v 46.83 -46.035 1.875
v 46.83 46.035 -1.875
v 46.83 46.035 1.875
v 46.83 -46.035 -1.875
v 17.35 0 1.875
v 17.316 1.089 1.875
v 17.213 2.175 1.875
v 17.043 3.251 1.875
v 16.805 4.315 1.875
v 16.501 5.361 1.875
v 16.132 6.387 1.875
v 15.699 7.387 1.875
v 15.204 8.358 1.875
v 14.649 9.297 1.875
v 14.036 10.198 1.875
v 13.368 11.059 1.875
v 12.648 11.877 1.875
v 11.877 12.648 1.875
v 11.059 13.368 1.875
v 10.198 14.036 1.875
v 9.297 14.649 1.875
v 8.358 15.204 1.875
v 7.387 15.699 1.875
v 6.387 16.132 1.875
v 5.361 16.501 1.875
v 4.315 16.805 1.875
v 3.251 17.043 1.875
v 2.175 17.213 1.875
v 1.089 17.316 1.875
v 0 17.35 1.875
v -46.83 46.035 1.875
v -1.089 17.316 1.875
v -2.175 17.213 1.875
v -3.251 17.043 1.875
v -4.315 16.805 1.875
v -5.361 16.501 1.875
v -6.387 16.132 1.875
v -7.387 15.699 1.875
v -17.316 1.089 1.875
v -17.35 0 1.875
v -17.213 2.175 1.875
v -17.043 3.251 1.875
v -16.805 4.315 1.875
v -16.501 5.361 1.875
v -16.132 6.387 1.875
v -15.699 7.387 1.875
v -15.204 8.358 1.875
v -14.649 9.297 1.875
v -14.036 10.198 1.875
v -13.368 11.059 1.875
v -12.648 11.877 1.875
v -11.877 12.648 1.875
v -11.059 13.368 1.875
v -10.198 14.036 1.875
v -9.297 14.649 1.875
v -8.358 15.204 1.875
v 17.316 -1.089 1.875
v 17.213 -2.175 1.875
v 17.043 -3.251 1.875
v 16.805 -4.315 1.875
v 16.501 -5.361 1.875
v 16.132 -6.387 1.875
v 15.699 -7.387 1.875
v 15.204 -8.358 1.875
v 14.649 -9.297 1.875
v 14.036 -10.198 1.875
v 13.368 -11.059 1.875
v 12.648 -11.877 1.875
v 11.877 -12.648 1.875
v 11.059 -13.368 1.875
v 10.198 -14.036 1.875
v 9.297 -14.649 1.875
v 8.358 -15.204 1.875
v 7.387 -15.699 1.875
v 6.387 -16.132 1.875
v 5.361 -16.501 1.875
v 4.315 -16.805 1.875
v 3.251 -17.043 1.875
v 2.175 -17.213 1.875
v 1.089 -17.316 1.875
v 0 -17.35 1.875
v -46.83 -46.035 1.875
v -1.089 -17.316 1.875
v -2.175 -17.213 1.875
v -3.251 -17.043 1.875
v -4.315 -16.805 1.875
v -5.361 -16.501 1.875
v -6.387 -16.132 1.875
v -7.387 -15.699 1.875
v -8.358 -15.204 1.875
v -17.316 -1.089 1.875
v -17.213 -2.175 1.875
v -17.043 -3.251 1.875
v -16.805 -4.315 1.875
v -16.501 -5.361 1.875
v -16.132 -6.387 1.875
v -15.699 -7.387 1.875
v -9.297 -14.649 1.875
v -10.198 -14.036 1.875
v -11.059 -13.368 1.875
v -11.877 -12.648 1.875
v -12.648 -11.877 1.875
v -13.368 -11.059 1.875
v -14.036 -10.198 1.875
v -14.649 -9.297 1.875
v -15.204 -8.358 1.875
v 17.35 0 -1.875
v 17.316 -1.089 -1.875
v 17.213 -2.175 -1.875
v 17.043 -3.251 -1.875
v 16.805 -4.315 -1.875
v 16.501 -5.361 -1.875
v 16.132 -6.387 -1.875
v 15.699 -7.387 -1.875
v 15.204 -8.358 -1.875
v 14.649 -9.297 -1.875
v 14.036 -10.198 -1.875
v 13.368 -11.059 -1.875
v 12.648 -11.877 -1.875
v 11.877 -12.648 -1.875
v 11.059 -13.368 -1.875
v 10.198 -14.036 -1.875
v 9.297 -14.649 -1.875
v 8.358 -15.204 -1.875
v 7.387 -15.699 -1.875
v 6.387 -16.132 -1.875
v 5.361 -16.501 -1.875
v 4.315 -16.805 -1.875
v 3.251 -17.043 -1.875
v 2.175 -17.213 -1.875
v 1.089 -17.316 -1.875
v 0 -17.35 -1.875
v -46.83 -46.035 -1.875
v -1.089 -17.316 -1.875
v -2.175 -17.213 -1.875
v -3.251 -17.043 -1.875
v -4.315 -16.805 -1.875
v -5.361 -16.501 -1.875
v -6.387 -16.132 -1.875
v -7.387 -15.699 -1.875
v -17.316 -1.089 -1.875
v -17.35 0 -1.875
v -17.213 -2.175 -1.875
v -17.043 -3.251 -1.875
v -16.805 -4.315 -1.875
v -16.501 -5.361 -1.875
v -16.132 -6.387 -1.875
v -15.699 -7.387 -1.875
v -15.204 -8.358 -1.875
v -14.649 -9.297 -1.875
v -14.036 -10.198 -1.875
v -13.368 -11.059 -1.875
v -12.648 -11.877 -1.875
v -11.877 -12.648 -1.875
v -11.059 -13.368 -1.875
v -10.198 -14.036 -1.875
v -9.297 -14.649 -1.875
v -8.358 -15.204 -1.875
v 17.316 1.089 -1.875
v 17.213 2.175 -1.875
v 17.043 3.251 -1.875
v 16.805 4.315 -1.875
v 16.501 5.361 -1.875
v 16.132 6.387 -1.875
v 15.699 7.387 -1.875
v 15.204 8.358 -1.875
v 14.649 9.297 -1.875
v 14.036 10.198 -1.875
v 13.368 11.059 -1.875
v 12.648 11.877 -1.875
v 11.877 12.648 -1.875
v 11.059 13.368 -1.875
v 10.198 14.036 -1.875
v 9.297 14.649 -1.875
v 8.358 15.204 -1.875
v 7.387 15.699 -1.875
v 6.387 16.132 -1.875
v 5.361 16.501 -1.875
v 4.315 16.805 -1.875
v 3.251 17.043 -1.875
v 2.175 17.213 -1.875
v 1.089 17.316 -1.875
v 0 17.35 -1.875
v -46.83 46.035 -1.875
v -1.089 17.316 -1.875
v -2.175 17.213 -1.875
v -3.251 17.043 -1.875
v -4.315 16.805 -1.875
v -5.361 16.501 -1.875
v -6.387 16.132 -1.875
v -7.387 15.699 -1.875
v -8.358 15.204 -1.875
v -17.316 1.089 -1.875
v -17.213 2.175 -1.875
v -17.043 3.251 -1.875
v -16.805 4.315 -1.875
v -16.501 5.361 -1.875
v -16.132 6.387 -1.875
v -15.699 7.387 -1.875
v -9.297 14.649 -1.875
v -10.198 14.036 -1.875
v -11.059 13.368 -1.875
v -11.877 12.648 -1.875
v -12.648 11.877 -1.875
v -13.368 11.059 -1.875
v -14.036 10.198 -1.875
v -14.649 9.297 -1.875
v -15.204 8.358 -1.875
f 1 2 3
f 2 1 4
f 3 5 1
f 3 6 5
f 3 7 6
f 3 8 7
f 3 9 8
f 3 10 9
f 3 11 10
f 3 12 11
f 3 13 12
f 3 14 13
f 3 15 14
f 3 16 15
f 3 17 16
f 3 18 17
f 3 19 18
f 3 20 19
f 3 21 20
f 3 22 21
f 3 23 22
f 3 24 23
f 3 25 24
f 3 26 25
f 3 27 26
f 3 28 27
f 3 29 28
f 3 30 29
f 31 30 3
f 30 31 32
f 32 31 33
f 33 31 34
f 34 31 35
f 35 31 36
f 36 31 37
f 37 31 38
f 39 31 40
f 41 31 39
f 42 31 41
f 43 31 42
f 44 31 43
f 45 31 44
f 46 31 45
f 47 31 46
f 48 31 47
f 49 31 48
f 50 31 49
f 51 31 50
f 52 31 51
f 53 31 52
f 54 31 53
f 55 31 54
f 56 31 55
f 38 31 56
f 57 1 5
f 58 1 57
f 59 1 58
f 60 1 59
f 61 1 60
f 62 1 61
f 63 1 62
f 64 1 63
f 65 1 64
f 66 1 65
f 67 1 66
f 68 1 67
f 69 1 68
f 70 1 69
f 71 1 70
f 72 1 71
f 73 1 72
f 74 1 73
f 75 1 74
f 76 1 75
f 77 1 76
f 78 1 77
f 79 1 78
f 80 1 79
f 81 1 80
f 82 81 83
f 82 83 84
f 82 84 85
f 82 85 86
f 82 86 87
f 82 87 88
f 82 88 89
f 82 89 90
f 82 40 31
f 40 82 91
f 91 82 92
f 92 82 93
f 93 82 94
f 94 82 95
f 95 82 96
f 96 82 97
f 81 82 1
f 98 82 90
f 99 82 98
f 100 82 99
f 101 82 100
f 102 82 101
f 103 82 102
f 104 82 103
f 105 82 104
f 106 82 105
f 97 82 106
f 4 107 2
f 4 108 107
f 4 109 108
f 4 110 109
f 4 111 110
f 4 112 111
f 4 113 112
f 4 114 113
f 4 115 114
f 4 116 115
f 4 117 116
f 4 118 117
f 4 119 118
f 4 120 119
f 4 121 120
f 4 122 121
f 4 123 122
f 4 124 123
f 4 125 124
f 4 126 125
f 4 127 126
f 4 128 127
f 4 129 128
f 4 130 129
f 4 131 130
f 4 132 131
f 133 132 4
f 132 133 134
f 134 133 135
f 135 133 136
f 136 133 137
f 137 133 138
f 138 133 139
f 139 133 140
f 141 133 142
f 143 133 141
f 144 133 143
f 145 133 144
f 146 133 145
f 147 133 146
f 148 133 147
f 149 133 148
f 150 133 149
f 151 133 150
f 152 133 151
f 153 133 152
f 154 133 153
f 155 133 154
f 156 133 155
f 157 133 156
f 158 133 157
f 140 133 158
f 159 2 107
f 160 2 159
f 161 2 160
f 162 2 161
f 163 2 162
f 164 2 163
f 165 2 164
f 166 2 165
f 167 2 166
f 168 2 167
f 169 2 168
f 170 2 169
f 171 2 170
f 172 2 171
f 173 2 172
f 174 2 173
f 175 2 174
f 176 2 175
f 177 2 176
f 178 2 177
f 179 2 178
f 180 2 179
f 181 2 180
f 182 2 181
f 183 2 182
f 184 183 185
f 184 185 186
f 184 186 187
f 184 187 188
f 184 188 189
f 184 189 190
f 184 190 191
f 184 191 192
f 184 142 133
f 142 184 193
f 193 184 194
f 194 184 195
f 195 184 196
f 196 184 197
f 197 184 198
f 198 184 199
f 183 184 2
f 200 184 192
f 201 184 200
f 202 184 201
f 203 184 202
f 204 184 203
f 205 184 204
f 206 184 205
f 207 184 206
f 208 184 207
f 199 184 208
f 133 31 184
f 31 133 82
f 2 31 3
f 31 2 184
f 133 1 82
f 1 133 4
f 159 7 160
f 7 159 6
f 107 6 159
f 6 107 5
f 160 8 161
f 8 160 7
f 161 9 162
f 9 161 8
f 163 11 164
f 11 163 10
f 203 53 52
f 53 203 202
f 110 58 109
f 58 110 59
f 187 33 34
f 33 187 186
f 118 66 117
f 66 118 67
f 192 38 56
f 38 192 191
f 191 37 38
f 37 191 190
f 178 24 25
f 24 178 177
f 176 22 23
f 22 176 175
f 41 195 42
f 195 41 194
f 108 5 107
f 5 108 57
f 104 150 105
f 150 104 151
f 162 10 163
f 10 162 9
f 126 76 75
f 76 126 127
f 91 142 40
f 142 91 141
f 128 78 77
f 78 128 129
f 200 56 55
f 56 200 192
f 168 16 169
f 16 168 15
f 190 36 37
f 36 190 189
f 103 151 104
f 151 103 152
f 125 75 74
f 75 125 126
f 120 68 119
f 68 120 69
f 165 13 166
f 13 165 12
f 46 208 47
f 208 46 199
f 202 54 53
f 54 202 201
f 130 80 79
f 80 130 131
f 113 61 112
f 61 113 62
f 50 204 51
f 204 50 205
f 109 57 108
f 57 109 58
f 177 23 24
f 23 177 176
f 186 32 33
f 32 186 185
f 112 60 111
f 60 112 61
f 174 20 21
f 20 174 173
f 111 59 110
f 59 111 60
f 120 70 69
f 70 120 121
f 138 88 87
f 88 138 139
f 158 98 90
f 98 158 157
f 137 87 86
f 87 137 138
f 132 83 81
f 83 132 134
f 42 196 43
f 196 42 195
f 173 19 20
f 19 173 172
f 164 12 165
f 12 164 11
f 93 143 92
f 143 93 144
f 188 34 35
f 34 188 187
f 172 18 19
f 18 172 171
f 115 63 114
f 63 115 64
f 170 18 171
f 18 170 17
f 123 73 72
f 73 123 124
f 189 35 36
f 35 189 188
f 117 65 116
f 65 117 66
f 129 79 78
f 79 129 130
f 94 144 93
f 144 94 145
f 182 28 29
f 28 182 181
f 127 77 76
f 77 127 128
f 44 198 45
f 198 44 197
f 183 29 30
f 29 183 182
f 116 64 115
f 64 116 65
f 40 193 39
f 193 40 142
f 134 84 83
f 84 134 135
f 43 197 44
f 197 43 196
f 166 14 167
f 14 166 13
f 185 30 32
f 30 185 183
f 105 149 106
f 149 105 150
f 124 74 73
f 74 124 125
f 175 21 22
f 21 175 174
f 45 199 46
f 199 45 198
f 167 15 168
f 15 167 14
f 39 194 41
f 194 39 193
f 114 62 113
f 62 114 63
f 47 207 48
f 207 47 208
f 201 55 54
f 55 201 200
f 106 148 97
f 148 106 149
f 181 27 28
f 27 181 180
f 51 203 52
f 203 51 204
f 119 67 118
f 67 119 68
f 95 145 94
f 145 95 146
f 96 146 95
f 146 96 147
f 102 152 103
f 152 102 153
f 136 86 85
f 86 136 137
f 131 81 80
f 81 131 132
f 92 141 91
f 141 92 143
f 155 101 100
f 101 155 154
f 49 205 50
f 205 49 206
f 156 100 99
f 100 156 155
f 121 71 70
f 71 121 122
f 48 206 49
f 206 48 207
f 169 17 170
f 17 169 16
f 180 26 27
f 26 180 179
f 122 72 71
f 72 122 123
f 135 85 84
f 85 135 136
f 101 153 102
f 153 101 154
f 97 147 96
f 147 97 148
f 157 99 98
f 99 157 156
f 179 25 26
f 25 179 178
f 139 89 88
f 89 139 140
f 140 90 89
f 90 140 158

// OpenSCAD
// file: common/lens-sizes.scad
// Film format lookup table
// Each entry: [format_name, mount_diameter, mount_thickness]
LENS_FORMATS = [
    ["Copal 0", 34.7, 3.75],
    ["Copal 1", 41.8, 3.75],
    ["Copal 3", 65, 4],
    ["Super Large Lens", 95, 4],
];

// Index constants for LENS_FORMATS table
_LF_NAME = 0;
_LF_MOUNT_DIAMETER = 1;
_LF_MOUNT_THICKNESS = 2;

// Core lookup function - returns the format entry or undef if not found
function _find_lens_format(format) =
    let (matches = [for (f = LENS_FORMATS) if (f[_LF_NAME] == format) f]) len(matches) > 0 ? matches[0] : undef;

// Unified function to get all lens format dimensions
// Returns: [mount_diameter, mount_thickness] or undef for unknown format
function get_lens_format(format) =
    let (entry = _find_lens_format(format)) entry != undef ? [entry[_LF_MOUNT_DIAMETER], entry[_LF_MOUNT_THICKNESS]]
    : undef;

// Backward-compatible accessor functions
function get_lens_format_mount_diameter(format) =
    get_lens_format(format)[0];

function get_lens_format_mount_thickness(format) =
    get_lens_format(format)[1];
// main file
include <common/lens-sizes.scad>

/* [Lens Settings] */
// Select lens mount type
Lens_Type = "Copal 0"; // ["Copal 0", "Copal 1", "Copal 3"]

/* [Hidden] */
$fn = 100;
LENS_BOARD_WIDTH = 93.66;
LENS_BOARD_LENGTH = 92.07;

// Get lens dimensions from lookup table
_lens_dims = get_lens_format(Lens_Type);
_lens_mount_diameter = _lens_dims[0];
_lens_mount_thickness = _lens_dims[1];

module graflex_lens_board(mount_diameter, board_thickness) {
    difference() {
        cube([LENS_BOARD_WIDTH, LENS_BOARD_LENGTH, board_thickness], center=true);
        cylinder(h=board_thickness + 0.1, d=mount_diameter, center=true);
    }
}

graflex_lens_board(_lens_mount_diameter, _lens_mount_thickness);
